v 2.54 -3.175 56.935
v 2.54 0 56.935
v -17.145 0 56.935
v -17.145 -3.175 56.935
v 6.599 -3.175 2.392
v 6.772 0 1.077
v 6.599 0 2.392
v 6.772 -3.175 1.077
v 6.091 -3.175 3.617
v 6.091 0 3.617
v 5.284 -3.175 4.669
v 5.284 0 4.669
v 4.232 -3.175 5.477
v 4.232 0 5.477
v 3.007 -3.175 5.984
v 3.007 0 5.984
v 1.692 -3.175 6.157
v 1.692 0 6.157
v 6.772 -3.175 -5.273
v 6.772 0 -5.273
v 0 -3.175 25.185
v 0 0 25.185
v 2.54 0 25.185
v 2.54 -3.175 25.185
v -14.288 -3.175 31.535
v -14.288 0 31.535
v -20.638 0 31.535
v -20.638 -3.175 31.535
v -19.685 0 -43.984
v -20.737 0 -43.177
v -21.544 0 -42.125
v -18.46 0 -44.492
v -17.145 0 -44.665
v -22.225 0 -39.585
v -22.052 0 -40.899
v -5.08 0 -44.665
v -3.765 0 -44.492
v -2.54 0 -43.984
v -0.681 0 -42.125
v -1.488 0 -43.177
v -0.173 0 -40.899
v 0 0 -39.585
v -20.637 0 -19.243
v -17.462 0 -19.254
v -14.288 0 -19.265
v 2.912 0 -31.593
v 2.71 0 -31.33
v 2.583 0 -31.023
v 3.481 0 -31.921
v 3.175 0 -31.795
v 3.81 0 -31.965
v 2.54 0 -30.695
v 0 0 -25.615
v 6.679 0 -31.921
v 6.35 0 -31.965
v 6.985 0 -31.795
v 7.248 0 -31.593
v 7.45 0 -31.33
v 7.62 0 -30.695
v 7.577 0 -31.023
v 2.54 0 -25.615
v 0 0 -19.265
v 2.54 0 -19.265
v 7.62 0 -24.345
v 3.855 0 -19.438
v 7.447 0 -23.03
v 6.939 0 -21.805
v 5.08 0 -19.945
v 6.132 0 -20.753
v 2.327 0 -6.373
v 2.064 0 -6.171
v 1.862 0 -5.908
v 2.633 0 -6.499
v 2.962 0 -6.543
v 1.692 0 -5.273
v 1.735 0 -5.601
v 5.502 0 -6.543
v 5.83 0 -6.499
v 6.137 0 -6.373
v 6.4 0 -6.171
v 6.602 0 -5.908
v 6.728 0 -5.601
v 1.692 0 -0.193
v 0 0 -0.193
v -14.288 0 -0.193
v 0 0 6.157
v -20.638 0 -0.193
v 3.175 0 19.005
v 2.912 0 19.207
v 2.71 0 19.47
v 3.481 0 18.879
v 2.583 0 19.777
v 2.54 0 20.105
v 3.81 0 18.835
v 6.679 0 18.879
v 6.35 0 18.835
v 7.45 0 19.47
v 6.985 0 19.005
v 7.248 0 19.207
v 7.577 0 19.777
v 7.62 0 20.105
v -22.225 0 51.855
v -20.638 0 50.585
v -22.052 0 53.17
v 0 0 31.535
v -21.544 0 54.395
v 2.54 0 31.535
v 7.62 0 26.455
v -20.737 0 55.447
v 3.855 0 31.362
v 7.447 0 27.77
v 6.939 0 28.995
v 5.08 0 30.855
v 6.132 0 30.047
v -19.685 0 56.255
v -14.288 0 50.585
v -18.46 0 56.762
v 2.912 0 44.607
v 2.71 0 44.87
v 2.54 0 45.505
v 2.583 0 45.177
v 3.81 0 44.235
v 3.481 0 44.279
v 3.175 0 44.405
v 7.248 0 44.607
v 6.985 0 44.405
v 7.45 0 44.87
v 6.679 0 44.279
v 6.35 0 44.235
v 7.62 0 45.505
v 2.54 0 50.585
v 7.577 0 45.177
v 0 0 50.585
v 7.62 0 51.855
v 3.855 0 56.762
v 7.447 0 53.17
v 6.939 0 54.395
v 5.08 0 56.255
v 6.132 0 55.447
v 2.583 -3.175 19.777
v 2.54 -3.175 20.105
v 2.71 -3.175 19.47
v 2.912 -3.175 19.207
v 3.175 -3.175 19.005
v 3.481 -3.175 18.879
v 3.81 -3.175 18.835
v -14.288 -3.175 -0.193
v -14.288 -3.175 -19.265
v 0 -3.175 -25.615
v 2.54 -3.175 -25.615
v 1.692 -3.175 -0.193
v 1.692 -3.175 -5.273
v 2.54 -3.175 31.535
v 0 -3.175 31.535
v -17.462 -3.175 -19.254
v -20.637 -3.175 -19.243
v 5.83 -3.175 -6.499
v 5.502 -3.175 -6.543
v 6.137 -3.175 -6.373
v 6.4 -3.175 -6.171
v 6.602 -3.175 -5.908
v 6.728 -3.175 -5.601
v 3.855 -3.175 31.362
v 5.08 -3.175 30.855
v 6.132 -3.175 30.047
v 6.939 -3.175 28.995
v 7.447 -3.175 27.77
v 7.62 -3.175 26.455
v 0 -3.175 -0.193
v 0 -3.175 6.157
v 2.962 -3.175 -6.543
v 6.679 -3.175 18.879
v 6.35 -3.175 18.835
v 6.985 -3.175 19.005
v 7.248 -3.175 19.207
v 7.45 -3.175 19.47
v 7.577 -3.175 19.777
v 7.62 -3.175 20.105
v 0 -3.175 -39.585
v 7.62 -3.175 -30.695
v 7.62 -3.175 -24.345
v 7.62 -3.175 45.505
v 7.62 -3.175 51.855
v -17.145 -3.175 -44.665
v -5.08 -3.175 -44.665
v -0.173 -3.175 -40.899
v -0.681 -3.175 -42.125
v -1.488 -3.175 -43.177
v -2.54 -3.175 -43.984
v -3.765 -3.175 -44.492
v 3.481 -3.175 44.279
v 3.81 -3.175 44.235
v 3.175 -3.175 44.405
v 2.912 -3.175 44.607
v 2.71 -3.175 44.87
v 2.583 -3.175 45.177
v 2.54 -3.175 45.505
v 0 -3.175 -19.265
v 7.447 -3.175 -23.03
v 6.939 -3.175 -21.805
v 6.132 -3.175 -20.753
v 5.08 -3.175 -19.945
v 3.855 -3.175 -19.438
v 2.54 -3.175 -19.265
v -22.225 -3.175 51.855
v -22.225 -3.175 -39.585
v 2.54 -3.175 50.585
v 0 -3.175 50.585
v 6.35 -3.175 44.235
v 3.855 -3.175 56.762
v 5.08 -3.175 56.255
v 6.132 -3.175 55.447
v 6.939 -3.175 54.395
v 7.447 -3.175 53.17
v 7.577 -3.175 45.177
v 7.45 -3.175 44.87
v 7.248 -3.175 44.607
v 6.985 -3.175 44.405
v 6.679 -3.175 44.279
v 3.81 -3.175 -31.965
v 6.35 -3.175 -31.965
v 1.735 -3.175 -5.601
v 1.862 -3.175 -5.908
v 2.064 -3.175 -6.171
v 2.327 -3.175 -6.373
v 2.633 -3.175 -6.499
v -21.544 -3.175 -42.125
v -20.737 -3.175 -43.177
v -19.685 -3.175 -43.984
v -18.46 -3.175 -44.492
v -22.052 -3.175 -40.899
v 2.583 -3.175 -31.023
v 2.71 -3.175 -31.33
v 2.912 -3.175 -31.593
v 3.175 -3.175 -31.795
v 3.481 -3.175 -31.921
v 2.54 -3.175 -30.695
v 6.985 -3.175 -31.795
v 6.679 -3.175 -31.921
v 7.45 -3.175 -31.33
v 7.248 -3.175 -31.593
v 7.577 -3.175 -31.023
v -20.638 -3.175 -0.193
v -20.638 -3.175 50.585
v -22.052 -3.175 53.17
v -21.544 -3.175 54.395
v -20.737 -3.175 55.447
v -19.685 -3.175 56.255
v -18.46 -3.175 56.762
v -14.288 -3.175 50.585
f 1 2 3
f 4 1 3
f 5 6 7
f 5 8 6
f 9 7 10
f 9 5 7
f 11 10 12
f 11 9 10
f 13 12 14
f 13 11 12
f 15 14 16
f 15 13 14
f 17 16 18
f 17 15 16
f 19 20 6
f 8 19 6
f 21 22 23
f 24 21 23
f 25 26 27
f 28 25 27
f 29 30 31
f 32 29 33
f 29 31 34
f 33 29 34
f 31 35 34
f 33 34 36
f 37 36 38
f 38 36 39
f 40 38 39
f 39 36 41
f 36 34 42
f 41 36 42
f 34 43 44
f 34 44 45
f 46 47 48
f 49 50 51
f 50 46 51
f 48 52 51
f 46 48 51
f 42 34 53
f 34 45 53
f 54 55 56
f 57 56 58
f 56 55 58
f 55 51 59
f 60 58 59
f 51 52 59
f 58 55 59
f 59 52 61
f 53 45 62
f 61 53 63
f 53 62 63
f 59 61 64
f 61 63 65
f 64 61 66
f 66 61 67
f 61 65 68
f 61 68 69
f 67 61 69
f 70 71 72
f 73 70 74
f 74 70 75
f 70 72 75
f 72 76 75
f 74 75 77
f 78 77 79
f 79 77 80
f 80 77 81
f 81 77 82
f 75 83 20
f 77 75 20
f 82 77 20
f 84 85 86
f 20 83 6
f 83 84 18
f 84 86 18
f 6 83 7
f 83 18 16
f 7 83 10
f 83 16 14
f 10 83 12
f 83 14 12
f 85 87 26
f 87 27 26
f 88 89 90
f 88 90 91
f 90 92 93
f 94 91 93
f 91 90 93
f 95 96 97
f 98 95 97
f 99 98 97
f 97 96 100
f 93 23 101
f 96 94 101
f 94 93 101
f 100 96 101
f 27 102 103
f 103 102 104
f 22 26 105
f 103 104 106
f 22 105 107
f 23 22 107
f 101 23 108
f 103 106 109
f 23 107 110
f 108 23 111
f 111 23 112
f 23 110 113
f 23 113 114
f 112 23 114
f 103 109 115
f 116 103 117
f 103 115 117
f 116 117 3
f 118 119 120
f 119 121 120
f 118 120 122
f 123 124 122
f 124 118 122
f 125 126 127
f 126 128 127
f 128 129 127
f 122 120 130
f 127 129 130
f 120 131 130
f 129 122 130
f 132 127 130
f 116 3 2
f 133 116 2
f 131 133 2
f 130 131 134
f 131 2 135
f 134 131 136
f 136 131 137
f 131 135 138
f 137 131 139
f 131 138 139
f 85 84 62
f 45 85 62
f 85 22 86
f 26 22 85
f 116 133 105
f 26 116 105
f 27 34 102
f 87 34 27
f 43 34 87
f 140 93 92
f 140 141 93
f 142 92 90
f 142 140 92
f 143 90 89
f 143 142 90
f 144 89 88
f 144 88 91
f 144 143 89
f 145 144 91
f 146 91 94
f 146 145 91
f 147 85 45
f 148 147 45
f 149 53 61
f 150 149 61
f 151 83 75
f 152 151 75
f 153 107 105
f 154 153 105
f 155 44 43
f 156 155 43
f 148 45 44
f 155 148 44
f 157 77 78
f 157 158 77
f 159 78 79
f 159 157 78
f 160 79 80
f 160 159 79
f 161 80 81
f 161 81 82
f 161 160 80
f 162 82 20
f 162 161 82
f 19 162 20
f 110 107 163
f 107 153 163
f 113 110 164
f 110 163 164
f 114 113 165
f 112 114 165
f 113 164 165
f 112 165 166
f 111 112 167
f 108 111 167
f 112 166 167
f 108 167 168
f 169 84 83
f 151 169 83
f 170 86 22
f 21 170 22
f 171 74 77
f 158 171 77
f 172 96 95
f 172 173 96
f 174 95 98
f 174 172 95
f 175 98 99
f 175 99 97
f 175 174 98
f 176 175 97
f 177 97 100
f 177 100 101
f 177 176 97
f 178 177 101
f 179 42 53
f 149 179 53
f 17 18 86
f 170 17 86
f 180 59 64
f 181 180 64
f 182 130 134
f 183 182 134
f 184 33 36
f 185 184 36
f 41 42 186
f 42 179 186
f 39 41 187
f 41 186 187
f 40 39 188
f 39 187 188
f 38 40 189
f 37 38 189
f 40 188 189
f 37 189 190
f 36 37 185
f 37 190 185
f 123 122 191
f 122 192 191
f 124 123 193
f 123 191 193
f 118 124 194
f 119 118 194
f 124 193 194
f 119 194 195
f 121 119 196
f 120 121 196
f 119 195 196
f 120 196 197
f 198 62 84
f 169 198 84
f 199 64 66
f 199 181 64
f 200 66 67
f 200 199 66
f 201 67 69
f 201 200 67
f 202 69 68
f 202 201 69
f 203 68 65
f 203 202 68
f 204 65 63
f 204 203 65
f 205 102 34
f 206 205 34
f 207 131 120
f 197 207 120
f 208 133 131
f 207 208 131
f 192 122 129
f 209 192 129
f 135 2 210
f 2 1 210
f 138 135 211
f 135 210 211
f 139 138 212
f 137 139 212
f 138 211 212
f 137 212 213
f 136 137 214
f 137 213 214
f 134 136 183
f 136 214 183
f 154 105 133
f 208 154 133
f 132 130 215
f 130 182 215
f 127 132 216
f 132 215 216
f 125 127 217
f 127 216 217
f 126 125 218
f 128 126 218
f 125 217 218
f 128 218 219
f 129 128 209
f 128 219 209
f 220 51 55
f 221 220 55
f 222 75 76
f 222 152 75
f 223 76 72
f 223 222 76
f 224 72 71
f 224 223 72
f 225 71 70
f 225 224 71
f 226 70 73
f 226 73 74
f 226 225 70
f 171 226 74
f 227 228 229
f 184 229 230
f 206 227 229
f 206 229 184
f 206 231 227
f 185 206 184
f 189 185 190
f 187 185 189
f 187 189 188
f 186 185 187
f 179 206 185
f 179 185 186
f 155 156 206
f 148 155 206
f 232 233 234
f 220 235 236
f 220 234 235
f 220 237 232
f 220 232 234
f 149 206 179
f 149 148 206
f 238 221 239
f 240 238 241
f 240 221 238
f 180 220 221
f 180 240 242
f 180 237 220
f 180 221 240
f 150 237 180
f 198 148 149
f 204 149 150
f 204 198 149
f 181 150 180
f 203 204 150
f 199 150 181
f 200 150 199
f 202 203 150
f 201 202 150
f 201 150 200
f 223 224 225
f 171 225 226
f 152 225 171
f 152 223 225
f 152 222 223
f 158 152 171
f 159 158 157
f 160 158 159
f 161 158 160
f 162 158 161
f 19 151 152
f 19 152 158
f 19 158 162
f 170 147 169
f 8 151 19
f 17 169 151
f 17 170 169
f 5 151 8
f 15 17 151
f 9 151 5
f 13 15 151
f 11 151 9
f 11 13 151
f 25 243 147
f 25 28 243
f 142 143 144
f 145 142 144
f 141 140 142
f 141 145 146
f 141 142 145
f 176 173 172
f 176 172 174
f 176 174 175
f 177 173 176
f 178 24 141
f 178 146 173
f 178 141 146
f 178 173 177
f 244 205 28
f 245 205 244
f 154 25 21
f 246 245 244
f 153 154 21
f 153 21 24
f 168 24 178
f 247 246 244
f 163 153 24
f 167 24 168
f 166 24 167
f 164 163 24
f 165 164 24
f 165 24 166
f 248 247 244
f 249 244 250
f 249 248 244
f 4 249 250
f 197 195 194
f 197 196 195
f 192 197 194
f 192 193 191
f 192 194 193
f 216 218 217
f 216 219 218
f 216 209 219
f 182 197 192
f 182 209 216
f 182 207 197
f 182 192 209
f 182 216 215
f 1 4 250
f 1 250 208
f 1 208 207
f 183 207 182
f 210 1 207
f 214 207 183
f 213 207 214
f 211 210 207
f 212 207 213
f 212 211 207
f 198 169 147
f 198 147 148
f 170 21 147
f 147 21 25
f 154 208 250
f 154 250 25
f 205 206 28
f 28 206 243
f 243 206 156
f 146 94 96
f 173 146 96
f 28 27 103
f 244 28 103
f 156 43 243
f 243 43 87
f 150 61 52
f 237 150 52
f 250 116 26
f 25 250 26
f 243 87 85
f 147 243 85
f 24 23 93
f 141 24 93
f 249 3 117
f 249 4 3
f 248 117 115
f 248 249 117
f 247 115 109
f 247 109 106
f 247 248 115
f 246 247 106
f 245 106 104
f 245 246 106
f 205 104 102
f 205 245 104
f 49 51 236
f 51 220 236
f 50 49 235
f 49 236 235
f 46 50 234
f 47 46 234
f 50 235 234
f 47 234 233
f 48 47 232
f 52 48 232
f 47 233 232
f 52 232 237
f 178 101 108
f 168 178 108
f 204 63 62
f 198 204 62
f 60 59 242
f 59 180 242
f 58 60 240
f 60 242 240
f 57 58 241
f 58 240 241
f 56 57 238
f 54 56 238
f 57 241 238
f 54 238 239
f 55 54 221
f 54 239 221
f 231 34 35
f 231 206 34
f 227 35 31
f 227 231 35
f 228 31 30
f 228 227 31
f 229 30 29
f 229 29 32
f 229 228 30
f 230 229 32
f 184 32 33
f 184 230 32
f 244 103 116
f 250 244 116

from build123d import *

# Parameters (mm, degrees)
F1_DEPTH = 3.175
F2_R     = 5.08
F3_R     = 5.08
F4_R     = 1.27


with BuildPart() as f1:
    # F0 (on Front) → F1 (new body)
    with BuildSketch(Plane.XZ):
        Polygon((0, 50.585326), (0, 56.935326), (-12.7, 56.935326), (-12.7, -44.664674), (0, -44.664674), (0, -25.614674), (0, -19.264674), (0, -0.192746), (0, 0), (0, 6.135326), (0, 6.157254), (0, 25.185326), (0, 31.535326), align=None)
        Polygon((7.62, 56.935326), (0, 56.935326), (0, 50.585326), (2.54, 50.585326), (2.54, 44.235326), (7.62, 44.235326), align=None)
        Polygon((7.62, 31.535326), (0, 31.535326), (0, 25.185326), (2.54, 25.185326), (2.54, 18.835326), (7.62, 18.835326), align=None)
        Polygon((6.77177, 6.157254), (0, 6.157254), (0, 6.135326), (0, 0), (0, -0.192746), (1.69177, -0.192746), (1.69177, -6.542746), (6.77177, -6.542746), align=None)
        Polygon((0, -19.264674), (0, -25.614674), (2.54, -25.614674), (2.54, -31.964674), (7.62, -31.964674), (7.62, -19.264674), align=None)
        Polygon((-12.7, -44.664674), (-12.7, 56.935326), (-17.4625, 56.935326), (-17.4625, 50.585326), (-14.2875, 50.585326), (-14.2875, 31.535326), (-17.4625, 31.535326), (-17.4625, -0.192746), (-14.2875, -0.192746), (-14.2875, -19.264674), (-17.4625, -19.25371), (-17.4625, -44.664674), align=None)
        Polygon((-17.4625, 50.585326), (-17.4625, 56.935326), (-22.225, 56.935326), (-22.225, -44.664674), (-17.4625, -44.664674), (-17.4625, -19.25371), (-20.637462, -19.242746), (-20.6375, -0.192746), (-17.4625, -0.192746), (-17.4625, 31.535326), (-20.6375, 31.535326), (-20.6375, 50.585326), align=None)
    extrude(amount=F1_DEPTH)

    # F2
    f2_edges = [f1.edges().sort_by_distance(p)[0] for p in [
        (-22.225, -1.5875, 56.935326),
        (-22.225, -1.5875, -44.664674),
        (0, -1.5875, -44.664674),
    ]]
    fillet(f2_edges, radius=F2_R)

    # F3
    f3_edges = [f1.edges().sort_by_distance(p)[0] for p in [
        (7.62, -1.5875, 31.535326),
        (6.77177, -1.5875, 6.157254),
        (7.62, -1.5875, -19.264674),
        (7.62, -1.5875, 56.935326),
    ]]
    fillet(f3_edges, radius=F3_R)

    # F4
    f4_edges = [f1.edges().sort_by_distance(p)[0] for p in [
        (7.62, -1.5875, 18.835326),
        (2.54, -1.5875, 18.835326),
        (6.77177, -1.5875, -6.542746),
        (1.69177, -1.5875, -6.542746),
        (2.54, -1.5875, 44.235326),
        (7.62, -1.5875, 44.235326),
        (7.62, -1.5875, -31.964674),
        (2.54, -1.5875, -31.964674),
    ]]
    fillet(f4_edges, radius=F4_R)


solid = f1.part
